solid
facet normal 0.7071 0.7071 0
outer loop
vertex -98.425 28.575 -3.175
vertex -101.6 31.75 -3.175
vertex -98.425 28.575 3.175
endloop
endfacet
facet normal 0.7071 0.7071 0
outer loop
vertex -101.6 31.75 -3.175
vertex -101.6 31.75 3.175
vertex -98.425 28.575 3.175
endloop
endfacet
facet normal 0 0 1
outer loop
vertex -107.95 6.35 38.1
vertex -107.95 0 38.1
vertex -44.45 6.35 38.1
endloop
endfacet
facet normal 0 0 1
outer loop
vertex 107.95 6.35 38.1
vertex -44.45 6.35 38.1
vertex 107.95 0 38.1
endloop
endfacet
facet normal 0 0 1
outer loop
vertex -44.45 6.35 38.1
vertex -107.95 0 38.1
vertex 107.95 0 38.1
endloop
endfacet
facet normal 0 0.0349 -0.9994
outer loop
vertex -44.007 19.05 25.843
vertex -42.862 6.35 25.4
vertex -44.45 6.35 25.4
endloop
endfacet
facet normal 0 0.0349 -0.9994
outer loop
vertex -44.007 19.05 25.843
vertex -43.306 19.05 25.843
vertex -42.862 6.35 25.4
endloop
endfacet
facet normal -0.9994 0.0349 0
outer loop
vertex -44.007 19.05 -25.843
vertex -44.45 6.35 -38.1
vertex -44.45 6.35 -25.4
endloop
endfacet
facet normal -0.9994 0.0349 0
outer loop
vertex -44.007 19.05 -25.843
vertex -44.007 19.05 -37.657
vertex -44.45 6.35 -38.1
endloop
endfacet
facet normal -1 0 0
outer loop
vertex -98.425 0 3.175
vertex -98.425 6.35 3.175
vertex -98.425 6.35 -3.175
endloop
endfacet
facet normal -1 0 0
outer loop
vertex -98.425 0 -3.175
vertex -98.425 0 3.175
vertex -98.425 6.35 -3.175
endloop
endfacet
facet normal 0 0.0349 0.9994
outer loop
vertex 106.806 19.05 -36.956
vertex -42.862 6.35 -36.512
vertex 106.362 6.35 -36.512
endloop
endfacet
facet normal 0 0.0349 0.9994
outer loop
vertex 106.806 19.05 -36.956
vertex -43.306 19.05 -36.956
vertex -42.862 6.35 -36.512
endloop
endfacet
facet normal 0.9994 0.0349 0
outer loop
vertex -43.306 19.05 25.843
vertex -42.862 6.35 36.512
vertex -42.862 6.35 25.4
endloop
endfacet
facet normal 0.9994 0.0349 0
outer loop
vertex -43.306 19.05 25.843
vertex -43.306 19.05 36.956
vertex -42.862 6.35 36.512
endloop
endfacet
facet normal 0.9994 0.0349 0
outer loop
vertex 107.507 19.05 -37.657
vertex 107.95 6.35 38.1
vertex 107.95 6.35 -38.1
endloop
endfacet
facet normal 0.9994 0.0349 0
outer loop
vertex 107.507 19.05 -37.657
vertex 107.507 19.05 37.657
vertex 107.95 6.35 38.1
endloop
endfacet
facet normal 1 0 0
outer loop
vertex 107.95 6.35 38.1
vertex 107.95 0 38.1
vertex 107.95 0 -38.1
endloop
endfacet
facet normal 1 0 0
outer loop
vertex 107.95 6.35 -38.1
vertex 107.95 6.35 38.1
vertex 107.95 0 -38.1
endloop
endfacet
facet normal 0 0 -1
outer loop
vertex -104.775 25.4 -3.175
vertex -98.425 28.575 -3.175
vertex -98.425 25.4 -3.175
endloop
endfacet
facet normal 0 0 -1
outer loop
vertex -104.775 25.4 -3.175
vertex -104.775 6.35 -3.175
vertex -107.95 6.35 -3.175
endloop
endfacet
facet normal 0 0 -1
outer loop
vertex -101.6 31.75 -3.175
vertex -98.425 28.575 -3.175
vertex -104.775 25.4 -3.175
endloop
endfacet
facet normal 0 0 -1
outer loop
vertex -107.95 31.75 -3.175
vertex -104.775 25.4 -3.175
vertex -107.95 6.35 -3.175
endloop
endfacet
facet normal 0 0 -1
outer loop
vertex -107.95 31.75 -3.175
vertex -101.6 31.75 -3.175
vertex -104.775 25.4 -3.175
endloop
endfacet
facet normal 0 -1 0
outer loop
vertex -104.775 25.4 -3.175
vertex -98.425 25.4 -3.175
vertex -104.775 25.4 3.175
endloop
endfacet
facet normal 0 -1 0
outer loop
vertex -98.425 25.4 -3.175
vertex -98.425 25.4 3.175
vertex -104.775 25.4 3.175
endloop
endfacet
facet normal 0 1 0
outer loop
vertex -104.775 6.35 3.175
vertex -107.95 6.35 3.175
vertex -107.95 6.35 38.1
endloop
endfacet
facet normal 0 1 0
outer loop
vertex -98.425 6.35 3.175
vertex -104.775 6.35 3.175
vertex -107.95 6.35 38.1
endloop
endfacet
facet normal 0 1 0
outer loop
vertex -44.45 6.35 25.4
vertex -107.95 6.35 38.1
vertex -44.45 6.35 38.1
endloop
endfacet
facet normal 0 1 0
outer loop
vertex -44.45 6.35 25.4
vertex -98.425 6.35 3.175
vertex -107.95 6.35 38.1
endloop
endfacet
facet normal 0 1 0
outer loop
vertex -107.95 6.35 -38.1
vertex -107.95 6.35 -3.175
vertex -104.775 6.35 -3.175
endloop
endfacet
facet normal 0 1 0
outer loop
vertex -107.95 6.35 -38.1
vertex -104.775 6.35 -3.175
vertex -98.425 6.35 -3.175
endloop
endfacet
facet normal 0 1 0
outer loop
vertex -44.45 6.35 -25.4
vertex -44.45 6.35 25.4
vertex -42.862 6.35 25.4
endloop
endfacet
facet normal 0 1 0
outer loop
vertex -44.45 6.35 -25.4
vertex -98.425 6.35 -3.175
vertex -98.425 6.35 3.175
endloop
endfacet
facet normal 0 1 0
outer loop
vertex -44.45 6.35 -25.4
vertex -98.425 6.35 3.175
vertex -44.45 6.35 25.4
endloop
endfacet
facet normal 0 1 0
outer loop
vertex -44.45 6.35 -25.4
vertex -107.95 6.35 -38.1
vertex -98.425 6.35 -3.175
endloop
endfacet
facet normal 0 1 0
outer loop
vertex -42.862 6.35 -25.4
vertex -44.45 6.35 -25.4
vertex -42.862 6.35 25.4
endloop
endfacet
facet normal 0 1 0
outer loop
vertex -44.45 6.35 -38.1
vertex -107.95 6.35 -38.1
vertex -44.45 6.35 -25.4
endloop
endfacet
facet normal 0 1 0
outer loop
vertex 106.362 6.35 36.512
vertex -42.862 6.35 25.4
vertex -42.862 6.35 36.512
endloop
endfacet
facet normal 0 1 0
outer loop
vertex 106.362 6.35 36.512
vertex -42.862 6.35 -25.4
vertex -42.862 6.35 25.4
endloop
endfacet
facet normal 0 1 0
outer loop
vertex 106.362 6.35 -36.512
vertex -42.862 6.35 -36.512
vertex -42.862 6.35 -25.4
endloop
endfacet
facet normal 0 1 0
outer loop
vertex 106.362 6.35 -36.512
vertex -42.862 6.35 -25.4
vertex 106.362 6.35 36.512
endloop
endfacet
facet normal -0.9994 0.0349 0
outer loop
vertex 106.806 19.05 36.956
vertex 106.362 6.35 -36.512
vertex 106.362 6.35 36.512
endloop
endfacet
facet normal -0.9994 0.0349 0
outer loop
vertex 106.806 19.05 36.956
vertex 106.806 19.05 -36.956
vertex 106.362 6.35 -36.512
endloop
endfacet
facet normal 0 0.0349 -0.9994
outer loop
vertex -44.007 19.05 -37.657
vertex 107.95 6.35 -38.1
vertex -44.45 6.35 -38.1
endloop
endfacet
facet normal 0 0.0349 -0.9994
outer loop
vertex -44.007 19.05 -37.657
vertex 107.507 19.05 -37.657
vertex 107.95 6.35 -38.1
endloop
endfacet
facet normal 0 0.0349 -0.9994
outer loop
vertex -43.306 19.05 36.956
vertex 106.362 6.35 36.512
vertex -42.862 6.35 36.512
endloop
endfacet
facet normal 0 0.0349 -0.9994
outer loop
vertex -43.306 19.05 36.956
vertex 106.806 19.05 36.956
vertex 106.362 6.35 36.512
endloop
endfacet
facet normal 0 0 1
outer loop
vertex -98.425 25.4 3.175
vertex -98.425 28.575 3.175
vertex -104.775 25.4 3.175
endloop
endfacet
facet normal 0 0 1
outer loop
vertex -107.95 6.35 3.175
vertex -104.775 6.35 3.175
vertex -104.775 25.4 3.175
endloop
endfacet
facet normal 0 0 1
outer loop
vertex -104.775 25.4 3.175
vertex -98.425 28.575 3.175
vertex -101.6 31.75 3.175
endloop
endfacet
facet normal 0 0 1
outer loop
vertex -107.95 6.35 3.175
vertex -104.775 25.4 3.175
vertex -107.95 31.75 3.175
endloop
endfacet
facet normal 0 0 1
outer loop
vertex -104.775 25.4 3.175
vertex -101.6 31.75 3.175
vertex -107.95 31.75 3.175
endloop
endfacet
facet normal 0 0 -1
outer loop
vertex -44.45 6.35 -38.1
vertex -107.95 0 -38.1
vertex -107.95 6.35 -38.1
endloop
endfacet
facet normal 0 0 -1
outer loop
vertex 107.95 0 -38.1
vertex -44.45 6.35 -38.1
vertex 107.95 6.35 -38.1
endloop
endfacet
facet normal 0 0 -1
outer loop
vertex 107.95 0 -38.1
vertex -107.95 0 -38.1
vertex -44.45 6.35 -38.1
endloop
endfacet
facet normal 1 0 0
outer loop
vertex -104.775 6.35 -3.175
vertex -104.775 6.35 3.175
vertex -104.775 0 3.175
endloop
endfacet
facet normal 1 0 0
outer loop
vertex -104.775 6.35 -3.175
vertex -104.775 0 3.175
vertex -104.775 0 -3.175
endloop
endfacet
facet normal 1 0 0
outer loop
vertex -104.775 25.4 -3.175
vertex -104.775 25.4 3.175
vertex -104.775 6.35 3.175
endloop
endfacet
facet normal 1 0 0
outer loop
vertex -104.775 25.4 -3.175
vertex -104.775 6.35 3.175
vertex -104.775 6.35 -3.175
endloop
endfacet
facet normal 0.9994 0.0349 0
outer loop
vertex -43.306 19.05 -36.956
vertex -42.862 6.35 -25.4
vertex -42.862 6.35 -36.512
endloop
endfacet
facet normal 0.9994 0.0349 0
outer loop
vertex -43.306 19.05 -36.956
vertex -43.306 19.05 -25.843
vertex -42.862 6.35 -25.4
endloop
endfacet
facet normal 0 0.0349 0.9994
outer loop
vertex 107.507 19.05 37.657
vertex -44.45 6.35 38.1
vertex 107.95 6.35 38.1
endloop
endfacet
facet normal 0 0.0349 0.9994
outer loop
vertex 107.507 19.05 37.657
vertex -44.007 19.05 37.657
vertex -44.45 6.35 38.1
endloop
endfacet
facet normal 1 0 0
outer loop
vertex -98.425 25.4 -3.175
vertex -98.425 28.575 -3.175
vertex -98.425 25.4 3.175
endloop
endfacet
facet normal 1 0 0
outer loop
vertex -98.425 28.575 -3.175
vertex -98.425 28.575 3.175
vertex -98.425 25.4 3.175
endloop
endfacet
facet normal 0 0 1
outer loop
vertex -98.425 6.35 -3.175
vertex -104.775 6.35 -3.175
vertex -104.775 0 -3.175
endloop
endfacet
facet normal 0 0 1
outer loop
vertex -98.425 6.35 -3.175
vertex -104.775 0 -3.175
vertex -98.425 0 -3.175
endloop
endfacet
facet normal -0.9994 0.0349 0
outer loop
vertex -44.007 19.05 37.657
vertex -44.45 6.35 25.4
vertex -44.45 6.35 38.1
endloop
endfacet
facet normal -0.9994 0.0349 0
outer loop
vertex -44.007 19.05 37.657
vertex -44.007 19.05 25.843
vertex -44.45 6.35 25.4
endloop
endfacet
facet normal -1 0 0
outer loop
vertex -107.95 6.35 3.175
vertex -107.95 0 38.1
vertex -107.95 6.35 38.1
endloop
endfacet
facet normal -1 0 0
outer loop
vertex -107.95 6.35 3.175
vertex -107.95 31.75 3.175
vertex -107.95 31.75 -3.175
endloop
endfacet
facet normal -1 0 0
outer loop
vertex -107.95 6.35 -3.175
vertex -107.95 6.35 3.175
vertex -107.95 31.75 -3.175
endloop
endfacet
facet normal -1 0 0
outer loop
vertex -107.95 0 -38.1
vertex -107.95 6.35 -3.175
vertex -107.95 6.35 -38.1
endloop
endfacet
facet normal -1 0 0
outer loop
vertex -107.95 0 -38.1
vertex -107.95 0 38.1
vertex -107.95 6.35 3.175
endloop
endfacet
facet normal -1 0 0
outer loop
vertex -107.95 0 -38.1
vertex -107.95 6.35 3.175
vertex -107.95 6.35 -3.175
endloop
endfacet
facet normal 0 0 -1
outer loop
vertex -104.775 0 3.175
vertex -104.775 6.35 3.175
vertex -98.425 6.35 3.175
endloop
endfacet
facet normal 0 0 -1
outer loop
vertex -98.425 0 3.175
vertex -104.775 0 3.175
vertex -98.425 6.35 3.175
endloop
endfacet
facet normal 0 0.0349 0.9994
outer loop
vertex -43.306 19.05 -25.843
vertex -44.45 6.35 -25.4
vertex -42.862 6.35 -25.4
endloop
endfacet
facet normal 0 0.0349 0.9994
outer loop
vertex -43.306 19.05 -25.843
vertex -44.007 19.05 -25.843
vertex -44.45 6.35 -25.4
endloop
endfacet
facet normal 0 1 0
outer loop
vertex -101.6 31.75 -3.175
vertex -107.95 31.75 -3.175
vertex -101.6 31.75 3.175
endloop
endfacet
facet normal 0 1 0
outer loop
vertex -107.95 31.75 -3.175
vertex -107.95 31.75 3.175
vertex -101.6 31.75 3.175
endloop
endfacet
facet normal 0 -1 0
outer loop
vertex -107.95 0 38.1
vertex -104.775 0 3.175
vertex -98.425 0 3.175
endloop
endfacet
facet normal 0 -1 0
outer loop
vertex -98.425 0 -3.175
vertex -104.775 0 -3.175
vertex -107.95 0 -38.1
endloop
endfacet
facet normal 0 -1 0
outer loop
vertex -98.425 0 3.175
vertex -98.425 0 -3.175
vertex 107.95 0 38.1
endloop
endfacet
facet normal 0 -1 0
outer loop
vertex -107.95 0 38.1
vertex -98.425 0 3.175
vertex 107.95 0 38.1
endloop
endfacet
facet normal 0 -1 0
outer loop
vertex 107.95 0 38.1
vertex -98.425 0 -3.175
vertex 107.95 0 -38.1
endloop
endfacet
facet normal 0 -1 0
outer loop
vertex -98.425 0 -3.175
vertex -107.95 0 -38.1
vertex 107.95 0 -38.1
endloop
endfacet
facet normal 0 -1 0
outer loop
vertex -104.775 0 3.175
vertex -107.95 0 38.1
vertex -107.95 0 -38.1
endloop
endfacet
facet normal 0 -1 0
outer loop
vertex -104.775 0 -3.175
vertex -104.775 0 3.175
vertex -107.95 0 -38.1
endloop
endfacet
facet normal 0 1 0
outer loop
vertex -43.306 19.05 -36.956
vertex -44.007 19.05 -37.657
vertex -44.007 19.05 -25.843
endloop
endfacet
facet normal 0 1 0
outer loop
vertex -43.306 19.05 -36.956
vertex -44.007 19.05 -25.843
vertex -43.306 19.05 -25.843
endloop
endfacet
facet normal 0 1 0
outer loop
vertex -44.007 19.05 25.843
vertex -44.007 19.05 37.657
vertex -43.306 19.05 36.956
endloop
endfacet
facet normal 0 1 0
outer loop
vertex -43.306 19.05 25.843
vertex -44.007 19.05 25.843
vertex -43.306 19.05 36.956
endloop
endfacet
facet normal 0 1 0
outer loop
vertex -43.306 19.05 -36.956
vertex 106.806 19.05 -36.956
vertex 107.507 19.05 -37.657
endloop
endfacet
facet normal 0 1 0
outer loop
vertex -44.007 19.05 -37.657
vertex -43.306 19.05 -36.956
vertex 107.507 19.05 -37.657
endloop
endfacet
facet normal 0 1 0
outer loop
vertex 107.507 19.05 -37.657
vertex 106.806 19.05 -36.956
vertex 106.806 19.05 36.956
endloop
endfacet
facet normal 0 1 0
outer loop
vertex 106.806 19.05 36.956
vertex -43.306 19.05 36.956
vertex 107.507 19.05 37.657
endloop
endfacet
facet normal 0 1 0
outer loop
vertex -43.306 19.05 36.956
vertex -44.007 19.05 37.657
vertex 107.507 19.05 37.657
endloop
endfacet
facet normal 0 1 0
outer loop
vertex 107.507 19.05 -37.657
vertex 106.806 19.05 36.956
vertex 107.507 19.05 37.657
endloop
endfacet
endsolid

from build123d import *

# Parameters (mm, degrees)
SKETCH1_W           = 215.9
SKETCH1_H           = 76.2
BOSS_EXTRUDE1_DEPTH = 6.35
BOSS_EXTRUDE2_DEPTH = 12.7
BOSS_EXTRUDE2_TAPER = 2
BOSS_EXTRUDE3_DEPTH = 3.175
SKETCH4_W           = 6.35
SKETCH4_H           = 6.35
CUT_EXTRUDE1_DEPTH  = 118.26027686


with BuildPart() as part:
    # Sketch1 → Boss-Extrude1 (new body)
    with BuildSketch(Plane(origin=(0, 0, 0), x_dir=(1, 0, 0), z_dir=(0, 1, 0))):
        Rectangle(SKETCH1_W, SKETCH1_H)
    extrude(amount=BOSS_EXTRUDE1_DEPTH)

    # Sketch2 → Boss-Extrude2 (add)
    with BuildSketch(Plane(origin=(0, 6.35, 0), x_dir=(1, 0, 0), z_dir=(0, 1, 0))):
        Polygon((-44.45, -38.1), (107.95, -38.1), (107.95, 38.1), (-44.45, 38.1), (-44.45, 25.4), (-42.8625, 25.4), (-42.8625, 36.5125), (106.3625, 36.5125), (106.3625, -36.5125), (-42.8625, -36.5125), (-42.8625, -25.4), (-44.45, -25.4), align=None)
    extrude(amount=BOSS_EXTRUDE2_DEPTH, taper=BOSS_EXTRUDE2_TAPER)

    # Sketch3 → Boss-Extrude3 (add, symmetric)
    with BuildSketch(Plane.XY):
        Polygon((-107.95, 6.35), (-107.95, 31.75), (-101.6, 31.75), (-98.425, 28.575), (-98.425, 25.4), (-104.775, 25.4), (-104.775, 6.35), align=None)
    extrude(amount=BOSS_EXTRUDE3_DEPTH, both=True)

    # Sketch4 → Cut-Extrude1 (cut, through all)
    with BuildSketch(Plane(origin=(0, 6.35, 0), x_dir=(1, 0, 0), z_dir=(0, 1, 0))):
        with Locations((-101.6, 0)):
            Rectangle(SKETCH4_W, SKETCH4_H)
    extrude(amount=-CUT_EXTRUDE1_DEPTH, mode=Mode.SUBTRACT)


solid = part.part
